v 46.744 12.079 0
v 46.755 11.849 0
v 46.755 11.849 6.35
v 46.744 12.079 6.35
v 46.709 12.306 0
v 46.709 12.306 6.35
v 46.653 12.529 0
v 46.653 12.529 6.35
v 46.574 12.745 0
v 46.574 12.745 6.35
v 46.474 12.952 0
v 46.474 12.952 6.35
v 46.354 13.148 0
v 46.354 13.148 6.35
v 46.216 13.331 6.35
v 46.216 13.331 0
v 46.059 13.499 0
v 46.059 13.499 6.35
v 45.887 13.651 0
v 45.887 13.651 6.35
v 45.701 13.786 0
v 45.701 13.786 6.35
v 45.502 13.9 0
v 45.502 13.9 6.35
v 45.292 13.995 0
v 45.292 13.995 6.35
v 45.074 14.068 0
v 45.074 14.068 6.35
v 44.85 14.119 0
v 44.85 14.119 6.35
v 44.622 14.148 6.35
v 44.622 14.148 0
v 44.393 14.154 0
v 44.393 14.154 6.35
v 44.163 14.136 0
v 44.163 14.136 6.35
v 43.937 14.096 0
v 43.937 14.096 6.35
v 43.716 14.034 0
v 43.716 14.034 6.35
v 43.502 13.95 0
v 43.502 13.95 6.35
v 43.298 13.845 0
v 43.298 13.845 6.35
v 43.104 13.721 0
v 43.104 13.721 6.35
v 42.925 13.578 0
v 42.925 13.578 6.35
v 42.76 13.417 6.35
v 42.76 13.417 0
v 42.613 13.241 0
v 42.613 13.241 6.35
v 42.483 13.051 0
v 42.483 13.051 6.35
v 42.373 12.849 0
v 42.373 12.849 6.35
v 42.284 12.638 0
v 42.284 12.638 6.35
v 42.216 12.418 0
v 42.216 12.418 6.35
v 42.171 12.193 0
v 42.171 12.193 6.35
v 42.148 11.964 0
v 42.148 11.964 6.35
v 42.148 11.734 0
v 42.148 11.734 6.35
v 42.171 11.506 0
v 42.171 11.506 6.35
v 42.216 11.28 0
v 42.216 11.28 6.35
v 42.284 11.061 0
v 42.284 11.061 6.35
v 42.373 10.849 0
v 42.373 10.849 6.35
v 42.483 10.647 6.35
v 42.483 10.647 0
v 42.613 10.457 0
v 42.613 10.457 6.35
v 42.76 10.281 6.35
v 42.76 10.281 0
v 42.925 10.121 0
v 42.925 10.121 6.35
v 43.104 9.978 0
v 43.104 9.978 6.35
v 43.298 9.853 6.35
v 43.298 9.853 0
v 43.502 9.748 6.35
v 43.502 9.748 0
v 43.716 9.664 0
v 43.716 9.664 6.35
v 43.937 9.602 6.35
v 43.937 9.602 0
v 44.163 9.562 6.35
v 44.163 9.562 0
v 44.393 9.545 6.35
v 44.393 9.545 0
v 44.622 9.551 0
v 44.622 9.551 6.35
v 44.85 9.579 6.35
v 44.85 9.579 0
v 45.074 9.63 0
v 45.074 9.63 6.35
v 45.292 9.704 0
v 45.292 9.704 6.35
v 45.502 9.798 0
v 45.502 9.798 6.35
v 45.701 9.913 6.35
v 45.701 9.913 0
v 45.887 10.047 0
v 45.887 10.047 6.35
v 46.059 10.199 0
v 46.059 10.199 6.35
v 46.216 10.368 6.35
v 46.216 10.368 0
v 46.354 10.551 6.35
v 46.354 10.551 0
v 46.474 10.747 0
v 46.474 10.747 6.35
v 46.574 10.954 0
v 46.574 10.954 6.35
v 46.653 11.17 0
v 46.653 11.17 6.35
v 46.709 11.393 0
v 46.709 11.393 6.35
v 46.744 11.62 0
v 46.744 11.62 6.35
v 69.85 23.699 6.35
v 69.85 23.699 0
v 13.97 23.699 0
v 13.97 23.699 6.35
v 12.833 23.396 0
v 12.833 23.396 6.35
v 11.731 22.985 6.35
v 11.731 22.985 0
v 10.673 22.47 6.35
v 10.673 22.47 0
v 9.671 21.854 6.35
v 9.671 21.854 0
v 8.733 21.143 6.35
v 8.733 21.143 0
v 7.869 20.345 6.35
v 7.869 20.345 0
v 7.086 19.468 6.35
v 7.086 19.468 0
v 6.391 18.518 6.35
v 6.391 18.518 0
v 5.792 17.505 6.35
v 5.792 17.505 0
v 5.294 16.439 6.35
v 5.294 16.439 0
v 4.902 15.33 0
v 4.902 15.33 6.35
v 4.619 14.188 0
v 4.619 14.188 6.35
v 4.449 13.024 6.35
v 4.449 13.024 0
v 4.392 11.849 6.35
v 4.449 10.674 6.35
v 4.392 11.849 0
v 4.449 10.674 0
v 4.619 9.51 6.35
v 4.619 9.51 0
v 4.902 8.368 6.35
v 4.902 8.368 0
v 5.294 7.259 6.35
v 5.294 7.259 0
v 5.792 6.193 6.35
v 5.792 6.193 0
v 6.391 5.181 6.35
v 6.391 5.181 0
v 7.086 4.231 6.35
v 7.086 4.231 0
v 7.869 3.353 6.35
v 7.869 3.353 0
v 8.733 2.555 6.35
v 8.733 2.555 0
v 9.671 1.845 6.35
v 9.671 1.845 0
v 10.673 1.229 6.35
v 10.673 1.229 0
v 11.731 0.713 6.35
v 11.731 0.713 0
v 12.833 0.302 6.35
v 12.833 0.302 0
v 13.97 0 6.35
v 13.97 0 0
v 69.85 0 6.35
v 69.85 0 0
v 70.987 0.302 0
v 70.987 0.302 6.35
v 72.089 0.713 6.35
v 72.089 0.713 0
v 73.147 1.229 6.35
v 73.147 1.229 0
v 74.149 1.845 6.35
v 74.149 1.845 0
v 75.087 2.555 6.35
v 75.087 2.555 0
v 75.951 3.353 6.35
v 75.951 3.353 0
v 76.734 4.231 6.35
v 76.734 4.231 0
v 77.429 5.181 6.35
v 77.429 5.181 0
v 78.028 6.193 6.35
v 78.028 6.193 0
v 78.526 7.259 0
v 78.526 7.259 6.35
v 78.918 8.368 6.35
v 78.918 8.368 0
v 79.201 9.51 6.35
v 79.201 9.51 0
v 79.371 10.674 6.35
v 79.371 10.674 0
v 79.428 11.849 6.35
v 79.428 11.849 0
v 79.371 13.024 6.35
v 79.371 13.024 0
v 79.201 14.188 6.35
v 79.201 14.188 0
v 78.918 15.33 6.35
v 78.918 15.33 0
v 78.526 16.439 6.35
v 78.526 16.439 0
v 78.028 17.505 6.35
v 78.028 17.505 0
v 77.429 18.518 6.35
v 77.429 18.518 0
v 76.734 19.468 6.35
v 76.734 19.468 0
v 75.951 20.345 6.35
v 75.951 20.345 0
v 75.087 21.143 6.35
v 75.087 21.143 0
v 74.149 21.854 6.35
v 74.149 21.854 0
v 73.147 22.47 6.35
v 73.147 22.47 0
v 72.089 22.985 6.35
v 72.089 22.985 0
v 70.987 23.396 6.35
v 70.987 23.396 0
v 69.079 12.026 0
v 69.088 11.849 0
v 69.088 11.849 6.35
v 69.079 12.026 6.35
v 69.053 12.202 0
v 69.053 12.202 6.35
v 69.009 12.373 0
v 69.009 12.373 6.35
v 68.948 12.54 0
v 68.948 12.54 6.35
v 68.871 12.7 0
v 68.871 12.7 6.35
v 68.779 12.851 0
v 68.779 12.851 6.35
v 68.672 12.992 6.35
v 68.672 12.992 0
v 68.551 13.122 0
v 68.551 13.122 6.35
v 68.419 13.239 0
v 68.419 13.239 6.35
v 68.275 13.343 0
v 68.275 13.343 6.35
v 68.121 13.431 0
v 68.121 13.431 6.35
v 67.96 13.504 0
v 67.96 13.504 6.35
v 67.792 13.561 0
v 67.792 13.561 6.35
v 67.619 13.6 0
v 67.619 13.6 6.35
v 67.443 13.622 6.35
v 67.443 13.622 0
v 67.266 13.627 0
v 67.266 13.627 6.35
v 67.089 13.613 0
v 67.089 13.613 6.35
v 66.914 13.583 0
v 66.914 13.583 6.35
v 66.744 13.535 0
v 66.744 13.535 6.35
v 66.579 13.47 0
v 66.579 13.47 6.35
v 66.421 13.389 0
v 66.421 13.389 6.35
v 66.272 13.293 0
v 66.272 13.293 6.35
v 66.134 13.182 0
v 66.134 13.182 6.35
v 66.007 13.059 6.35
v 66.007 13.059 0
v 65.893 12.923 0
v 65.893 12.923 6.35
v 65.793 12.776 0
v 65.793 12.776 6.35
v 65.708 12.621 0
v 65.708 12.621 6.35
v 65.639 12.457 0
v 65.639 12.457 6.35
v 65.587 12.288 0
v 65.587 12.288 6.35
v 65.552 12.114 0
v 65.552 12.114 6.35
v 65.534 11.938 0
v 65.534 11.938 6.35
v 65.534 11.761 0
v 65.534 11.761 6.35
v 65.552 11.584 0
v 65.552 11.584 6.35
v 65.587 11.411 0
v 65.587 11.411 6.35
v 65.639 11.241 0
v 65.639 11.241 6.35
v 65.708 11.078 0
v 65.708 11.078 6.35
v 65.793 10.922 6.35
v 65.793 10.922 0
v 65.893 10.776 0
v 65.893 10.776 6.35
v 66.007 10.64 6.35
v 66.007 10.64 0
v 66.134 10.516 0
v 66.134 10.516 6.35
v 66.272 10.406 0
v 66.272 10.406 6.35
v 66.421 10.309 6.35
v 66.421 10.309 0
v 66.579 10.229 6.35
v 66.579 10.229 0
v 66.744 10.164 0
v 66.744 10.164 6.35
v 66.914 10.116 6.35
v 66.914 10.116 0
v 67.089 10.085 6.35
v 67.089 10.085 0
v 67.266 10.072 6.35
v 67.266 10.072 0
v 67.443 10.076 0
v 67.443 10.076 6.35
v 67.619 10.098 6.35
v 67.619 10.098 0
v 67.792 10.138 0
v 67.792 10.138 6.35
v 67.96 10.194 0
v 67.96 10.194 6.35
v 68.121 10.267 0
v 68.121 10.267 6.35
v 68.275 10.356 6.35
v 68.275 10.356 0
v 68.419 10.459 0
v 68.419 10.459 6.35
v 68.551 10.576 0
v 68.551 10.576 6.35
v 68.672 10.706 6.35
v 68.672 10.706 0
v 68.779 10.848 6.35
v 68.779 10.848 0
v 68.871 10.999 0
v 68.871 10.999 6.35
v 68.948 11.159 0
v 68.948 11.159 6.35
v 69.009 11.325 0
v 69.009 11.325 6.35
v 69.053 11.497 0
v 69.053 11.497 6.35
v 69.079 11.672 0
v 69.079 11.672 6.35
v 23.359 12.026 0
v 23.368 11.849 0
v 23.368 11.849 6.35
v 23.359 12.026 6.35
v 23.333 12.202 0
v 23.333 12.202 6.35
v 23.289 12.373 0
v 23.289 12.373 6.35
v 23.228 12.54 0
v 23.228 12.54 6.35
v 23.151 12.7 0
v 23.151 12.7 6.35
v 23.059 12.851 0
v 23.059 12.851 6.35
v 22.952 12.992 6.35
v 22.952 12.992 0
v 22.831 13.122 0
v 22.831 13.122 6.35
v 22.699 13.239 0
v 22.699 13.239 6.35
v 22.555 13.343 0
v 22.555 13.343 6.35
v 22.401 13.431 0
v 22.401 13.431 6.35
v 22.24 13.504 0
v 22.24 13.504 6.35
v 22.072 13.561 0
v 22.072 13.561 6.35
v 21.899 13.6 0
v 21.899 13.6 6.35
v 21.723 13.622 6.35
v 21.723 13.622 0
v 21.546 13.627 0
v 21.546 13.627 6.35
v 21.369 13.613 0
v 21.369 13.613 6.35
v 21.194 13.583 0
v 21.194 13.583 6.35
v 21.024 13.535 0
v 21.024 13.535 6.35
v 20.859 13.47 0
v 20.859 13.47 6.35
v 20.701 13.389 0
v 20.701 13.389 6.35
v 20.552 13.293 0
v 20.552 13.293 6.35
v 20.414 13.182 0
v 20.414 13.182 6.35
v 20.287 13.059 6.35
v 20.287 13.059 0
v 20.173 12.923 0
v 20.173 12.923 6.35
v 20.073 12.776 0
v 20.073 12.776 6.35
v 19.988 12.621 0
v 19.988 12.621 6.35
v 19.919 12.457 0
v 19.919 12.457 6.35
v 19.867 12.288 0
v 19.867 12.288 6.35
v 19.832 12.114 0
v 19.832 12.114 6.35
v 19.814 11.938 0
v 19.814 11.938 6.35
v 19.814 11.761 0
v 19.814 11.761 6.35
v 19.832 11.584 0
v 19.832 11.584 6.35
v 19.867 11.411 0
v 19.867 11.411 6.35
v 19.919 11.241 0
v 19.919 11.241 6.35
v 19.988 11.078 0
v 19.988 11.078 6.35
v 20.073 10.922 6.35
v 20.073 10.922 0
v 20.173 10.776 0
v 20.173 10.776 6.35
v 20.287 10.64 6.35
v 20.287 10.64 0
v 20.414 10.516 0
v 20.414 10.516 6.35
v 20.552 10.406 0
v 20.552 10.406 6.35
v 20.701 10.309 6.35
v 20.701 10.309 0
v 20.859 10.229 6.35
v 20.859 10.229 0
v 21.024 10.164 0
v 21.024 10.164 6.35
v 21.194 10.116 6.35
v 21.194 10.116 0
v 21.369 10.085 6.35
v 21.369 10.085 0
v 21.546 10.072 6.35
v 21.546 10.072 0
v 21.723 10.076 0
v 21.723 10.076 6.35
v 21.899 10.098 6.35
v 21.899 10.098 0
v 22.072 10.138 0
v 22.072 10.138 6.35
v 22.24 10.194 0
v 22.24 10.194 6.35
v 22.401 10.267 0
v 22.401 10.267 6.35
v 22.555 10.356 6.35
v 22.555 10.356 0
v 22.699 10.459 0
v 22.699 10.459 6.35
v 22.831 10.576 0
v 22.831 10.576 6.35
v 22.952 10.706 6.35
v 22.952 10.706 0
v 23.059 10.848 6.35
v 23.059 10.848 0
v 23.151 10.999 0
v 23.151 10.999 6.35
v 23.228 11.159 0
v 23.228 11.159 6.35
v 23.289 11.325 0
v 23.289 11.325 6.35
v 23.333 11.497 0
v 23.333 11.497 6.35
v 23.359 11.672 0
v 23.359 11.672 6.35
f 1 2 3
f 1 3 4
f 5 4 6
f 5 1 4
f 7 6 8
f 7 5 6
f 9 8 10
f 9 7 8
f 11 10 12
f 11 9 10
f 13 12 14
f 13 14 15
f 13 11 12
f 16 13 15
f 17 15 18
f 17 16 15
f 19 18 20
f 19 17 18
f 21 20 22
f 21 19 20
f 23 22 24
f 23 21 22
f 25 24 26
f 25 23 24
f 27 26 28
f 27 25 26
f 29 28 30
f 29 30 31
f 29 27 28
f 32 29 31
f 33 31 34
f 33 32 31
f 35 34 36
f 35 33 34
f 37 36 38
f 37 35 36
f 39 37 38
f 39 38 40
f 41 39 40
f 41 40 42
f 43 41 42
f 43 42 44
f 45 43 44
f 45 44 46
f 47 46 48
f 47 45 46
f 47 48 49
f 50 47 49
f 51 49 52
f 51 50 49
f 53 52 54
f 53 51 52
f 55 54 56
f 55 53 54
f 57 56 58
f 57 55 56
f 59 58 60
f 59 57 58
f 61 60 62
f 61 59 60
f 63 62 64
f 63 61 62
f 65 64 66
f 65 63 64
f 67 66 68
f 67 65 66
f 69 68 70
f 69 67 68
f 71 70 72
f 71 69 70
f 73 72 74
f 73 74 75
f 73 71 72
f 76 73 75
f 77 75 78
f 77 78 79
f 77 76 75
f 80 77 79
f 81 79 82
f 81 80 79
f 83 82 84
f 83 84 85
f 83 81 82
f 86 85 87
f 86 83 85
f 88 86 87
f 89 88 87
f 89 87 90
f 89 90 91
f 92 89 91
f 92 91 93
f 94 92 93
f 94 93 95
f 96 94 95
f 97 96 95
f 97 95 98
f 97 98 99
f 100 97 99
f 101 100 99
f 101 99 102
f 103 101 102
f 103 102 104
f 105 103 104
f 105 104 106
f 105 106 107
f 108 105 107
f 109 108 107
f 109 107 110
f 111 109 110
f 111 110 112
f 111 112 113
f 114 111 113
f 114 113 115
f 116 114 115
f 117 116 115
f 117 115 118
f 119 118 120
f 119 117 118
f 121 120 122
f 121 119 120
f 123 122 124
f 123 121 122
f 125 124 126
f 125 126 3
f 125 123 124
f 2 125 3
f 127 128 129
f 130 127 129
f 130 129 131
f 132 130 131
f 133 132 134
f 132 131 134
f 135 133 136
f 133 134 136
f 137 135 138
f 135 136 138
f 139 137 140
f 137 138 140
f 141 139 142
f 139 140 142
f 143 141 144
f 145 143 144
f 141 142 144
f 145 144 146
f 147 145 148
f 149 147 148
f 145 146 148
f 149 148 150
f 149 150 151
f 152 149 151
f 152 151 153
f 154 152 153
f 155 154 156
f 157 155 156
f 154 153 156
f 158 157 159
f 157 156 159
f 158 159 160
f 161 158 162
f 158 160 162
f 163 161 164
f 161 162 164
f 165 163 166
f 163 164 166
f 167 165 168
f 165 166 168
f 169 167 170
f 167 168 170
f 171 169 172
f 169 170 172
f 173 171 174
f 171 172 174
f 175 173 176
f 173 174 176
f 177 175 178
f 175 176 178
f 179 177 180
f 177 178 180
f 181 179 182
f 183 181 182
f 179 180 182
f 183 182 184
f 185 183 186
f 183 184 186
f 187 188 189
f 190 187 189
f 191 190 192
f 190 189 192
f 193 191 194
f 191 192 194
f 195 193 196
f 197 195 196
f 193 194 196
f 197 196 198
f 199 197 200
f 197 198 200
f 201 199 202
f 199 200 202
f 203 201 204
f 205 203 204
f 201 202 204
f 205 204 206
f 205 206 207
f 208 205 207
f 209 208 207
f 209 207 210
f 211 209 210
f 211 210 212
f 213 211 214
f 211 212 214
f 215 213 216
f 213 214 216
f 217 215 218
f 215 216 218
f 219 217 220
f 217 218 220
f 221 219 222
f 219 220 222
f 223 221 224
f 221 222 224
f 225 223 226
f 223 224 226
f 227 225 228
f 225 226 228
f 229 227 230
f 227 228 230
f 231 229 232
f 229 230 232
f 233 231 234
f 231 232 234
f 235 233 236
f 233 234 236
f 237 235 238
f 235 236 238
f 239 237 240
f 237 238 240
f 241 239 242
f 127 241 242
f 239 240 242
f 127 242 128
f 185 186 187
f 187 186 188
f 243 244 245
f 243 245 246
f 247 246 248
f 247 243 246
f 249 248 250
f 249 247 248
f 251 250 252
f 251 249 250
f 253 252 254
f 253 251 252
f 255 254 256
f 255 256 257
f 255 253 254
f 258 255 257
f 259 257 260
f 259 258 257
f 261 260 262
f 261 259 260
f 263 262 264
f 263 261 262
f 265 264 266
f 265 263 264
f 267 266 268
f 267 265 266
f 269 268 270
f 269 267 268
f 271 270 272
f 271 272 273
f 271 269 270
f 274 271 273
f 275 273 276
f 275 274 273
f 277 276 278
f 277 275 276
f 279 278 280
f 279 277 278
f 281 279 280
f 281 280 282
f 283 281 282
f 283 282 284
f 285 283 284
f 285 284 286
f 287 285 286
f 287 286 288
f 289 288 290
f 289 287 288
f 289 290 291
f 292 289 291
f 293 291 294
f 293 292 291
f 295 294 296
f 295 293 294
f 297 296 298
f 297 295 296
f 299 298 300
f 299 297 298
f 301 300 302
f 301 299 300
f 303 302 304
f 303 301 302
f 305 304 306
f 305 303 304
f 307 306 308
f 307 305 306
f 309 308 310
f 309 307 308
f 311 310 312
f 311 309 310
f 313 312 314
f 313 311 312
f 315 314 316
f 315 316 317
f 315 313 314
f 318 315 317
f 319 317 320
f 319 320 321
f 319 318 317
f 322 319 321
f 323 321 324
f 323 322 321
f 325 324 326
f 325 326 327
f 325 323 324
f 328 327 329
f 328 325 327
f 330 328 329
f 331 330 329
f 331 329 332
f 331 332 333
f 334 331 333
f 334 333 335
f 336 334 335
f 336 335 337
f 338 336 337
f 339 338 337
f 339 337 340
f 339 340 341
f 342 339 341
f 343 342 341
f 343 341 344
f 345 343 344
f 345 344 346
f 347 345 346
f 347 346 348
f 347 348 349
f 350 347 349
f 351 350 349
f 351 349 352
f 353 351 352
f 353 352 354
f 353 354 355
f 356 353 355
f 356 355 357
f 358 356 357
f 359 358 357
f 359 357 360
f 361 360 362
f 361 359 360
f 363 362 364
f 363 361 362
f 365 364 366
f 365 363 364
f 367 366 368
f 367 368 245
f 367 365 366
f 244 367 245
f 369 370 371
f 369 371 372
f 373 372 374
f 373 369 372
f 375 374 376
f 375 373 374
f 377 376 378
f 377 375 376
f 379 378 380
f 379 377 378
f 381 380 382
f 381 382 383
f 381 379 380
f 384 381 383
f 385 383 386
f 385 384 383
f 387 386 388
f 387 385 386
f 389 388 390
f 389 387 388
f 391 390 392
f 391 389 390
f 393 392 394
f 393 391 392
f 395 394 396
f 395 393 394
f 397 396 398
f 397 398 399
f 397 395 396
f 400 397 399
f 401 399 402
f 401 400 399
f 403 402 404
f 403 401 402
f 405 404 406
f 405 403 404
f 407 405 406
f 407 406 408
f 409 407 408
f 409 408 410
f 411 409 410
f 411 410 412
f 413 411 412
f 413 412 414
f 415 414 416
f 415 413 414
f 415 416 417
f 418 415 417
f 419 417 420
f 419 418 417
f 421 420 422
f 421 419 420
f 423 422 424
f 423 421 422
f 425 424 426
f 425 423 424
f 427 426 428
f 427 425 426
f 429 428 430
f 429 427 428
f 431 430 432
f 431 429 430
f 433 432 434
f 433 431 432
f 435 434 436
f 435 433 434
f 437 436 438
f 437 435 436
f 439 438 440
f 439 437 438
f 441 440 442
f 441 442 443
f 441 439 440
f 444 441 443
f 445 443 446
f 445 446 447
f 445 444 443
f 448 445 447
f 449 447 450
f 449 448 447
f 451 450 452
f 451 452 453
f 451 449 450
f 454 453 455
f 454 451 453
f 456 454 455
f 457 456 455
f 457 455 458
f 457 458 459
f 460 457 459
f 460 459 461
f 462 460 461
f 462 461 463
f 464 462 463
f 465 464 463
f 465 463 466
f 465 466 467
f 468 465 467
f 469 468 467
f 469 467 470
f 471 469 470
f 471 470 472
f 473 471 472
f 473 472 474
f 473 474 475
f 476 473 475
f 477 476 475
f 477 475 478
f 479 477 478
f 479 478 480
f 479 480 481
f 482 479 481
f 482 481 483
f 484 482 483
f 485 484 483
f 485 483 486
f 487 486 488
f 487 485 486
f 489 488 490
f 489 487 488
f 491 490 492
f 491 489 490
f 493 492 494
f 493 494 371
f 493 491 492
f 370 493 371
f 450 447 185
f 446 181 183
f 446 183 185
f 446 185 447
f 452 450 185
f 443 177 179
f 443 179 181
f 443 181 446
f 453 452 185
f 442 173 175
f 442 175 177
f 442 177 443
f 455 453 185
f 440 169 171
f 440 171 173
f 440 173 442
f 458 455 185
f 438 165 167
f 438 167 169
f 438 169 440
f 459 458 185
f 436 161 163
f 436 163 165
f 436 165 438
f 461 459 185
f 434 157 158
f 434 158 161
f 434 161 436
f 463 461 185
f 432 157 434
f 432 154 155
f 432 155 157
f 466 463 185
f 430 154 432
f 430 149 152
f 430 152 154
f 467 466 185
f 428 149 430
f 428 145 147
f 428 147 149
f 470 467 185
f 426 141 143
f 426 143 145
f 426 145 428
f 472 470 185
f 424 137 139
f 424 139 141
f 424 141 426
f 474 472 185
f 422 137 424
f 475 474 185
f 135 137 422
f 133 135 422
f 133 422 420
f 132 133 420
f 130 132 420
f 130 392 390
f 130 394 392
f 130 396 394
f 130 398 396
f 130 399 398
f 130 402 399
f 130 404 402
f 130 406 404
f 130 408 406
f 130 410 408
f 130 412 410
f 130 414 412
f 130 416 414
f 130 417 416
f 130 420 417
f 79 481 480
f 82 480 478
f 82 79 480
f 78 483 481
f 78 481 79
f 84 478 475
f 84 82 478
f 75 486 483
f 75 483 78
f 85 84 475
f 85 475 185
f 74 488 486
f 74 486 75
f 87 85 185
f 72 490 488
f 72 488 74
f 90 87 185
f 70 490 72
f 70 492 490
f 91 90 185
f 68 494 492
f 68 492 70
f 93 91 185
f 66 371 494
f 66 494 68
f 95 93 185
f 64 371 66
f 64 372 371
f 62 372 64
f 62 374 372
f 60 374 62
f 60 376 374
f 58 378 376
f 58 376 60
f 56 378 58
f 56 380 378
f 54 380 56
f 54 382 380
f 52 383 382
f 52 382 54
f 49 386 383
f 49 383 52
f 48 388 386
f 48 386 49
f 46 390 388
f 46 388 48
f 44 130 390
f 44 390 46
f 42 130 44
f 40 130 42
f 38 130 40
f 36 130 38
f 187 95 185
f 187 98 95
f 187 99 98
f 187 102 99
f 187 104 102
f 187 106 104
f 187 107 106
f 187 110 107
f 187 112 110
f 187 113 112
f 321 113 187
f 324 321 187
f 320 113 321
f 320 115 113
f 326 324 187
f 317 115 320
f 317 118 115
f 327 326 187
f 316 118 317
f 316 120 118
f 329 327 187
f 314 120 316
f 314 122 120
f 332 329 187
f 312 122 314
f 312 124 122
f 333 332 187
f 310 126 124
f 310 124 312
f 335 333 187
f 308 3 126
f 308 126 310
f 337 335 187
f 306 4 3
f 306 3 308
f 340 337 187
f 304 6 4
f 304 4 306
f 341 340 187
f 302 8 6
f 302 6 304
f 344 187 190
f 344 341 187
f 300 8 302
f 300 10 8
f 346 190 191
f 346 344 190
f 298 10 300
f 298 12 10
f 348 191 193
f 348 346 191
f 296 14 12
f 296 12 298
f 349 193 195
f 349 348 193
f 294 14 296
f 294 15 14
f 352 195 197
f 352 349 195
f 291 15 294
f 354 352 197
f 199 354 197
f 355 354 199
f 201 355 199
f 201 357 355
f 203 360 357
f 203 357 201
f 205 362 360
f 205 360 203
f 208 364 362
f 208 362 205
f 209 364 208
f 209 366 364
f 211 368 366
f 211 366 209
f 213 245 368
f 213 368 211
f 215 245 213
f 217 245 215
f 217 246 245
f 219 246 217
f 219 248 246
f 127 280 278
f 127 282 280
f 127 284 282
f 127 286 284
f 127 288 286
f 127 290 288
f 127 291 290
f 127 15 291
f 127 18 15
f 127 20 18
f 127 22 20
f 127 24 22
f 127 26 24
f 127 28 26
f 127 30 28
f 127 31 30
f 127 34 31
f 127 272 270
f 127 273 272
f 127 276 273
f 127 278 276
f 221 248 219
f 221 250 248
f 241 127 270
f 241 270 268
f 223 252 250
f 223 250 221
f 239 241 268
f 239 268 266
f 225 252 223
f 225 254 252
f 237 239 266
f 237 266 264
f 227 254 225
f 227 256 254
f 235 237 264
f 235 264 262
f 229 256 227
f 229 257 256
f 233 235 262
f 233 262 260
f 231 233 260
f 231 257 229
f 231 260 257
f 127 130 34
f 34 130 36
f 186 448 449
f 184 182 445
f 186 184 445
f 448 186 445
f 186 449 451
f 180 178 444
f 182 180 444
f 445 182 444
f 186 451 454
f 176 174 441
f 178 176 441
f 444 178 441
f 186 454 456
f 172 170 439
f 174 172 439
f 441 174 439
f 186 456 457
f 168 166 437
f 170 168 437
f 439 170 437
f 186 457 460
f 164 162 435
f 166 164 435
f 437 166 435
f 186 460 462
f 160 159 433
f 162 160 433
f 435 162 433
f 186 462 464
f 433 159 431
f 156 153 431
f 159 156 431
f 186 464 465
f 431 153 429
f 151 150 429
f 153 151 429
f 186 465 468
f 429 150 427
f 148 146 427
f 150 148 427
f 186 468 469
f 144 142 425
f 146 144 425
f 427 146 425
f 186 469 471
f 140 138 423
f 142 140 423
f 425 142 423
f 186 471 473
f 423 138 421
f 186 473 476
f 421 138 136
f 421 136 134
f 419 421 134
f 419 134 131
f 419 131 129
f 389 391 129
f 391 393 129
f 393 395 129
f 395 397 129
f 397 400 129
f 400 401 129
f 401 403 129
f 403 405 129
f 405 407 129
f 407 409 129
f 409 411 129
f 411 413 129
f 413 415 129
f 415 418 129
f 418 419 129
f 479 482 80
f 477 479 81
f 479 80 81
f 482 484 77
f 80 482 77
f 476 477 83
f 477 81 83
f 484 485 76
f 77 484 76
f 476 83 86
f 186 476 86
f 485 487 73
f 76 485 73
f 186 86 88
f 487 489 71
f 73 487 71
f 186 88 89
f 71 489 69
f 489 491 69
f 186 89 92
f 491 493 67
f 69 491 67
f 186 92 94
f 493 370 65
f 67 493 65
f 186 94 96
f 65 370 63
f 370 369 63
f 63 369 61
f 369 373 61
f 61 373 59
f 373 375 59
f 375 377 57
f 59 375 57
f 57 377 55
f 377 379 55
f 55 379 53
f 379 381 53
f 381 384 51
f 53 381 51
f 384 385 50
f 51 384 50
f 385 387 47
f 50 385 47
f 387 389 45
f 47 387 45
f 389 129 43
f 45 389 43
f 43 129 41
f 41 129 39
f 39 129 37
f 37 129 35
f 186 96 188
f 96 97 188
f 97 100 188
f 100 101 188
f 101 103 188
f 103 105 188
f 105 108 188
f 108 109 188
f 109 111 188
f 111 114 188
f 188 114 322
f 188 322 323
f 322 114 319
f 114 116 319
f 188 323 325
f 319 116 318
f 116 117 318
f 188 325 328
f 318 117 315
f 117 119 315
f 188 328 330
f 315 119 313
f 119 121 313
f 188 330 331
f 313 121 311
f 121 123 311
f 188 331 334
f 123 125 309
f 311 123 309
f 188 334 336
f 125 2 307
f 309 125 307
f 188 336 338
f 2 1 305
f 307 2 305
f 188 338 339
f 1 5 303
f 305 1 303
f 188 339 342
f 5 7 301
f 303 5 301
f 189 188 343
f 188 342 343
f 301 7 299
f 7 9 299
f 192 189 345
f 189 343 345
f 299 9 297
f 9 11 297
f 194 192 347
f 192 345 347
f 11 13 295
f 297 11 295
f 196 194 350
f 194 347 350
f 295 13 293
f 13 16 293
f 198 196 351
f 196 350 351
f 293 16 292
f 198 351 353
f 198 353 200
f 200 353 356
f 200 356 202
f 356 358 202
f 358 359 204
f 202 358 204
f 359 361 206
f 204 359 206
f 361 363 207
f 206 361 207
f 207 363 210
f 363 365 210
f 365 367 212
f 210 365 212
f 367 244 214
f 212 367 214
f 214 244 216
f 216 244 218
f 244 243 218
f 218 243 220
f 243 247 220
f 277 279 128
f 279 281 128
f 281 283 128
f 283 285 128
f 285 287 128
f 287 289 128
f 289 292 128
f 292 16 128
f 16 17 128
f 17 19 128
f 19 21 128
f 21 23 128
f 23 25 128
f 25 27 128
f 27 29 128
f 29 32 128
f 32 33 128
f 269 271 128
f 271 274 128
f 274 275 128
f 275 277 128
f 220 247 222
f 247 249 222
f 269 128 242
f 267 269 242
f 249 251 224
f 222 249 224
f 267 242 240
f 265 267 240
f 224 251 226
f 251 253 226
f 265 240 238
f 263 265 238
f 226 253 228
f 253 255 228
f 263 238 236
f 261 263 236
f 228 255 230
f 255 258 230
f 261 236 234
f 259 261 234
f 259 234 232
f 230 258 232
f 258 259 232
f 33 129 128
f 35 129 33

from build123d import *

# Parameters (mm, degrees)
SKETCH9_R           = 2.305
SKETCH9_R_2         = 1.778
BOSS_EXTRUDE1_DEPTH = 6.35


with BuildPart() as part:
    # Sketch9 → Boss-Extrude1 (new body)
    with BuildSketch(Plane.XY):
        with BuildLine():
            Line((19.05, 0), (69.85, 0))
            ThreePointArc((69.85, 0), (79.428440233, 11.849261314), (69.85, 23.698522628))
            Line((69.85, 23.698522628), (19.05, 23.698522628))
            Line((19.05, 23.698522628), (13.97, 23.698522628))
            ThreePointArc((13.97, 23.698522628), (4.391559767, 11.849261314), (13.97, 0))
            Line((13.97, 0), (19.05, 0))
        make_face()
        with Locations((44.45, 11.849261314)):
            Circle(SKETCH9_R, mode=Mode.SUBTRACT)
        with Locations((67.31, 11.849261314)):
            Circle(SKETCH9_R_2, mode=Mode.SUBTRACT)
        with Locations((21.59, 11.849261314)):
            Circle(SKETCH9_R_2, mode=Mode.SUBTRACT)
    extrude(amount=BOSS_EXTRUDE1_DEPTH)


solid = part.part
